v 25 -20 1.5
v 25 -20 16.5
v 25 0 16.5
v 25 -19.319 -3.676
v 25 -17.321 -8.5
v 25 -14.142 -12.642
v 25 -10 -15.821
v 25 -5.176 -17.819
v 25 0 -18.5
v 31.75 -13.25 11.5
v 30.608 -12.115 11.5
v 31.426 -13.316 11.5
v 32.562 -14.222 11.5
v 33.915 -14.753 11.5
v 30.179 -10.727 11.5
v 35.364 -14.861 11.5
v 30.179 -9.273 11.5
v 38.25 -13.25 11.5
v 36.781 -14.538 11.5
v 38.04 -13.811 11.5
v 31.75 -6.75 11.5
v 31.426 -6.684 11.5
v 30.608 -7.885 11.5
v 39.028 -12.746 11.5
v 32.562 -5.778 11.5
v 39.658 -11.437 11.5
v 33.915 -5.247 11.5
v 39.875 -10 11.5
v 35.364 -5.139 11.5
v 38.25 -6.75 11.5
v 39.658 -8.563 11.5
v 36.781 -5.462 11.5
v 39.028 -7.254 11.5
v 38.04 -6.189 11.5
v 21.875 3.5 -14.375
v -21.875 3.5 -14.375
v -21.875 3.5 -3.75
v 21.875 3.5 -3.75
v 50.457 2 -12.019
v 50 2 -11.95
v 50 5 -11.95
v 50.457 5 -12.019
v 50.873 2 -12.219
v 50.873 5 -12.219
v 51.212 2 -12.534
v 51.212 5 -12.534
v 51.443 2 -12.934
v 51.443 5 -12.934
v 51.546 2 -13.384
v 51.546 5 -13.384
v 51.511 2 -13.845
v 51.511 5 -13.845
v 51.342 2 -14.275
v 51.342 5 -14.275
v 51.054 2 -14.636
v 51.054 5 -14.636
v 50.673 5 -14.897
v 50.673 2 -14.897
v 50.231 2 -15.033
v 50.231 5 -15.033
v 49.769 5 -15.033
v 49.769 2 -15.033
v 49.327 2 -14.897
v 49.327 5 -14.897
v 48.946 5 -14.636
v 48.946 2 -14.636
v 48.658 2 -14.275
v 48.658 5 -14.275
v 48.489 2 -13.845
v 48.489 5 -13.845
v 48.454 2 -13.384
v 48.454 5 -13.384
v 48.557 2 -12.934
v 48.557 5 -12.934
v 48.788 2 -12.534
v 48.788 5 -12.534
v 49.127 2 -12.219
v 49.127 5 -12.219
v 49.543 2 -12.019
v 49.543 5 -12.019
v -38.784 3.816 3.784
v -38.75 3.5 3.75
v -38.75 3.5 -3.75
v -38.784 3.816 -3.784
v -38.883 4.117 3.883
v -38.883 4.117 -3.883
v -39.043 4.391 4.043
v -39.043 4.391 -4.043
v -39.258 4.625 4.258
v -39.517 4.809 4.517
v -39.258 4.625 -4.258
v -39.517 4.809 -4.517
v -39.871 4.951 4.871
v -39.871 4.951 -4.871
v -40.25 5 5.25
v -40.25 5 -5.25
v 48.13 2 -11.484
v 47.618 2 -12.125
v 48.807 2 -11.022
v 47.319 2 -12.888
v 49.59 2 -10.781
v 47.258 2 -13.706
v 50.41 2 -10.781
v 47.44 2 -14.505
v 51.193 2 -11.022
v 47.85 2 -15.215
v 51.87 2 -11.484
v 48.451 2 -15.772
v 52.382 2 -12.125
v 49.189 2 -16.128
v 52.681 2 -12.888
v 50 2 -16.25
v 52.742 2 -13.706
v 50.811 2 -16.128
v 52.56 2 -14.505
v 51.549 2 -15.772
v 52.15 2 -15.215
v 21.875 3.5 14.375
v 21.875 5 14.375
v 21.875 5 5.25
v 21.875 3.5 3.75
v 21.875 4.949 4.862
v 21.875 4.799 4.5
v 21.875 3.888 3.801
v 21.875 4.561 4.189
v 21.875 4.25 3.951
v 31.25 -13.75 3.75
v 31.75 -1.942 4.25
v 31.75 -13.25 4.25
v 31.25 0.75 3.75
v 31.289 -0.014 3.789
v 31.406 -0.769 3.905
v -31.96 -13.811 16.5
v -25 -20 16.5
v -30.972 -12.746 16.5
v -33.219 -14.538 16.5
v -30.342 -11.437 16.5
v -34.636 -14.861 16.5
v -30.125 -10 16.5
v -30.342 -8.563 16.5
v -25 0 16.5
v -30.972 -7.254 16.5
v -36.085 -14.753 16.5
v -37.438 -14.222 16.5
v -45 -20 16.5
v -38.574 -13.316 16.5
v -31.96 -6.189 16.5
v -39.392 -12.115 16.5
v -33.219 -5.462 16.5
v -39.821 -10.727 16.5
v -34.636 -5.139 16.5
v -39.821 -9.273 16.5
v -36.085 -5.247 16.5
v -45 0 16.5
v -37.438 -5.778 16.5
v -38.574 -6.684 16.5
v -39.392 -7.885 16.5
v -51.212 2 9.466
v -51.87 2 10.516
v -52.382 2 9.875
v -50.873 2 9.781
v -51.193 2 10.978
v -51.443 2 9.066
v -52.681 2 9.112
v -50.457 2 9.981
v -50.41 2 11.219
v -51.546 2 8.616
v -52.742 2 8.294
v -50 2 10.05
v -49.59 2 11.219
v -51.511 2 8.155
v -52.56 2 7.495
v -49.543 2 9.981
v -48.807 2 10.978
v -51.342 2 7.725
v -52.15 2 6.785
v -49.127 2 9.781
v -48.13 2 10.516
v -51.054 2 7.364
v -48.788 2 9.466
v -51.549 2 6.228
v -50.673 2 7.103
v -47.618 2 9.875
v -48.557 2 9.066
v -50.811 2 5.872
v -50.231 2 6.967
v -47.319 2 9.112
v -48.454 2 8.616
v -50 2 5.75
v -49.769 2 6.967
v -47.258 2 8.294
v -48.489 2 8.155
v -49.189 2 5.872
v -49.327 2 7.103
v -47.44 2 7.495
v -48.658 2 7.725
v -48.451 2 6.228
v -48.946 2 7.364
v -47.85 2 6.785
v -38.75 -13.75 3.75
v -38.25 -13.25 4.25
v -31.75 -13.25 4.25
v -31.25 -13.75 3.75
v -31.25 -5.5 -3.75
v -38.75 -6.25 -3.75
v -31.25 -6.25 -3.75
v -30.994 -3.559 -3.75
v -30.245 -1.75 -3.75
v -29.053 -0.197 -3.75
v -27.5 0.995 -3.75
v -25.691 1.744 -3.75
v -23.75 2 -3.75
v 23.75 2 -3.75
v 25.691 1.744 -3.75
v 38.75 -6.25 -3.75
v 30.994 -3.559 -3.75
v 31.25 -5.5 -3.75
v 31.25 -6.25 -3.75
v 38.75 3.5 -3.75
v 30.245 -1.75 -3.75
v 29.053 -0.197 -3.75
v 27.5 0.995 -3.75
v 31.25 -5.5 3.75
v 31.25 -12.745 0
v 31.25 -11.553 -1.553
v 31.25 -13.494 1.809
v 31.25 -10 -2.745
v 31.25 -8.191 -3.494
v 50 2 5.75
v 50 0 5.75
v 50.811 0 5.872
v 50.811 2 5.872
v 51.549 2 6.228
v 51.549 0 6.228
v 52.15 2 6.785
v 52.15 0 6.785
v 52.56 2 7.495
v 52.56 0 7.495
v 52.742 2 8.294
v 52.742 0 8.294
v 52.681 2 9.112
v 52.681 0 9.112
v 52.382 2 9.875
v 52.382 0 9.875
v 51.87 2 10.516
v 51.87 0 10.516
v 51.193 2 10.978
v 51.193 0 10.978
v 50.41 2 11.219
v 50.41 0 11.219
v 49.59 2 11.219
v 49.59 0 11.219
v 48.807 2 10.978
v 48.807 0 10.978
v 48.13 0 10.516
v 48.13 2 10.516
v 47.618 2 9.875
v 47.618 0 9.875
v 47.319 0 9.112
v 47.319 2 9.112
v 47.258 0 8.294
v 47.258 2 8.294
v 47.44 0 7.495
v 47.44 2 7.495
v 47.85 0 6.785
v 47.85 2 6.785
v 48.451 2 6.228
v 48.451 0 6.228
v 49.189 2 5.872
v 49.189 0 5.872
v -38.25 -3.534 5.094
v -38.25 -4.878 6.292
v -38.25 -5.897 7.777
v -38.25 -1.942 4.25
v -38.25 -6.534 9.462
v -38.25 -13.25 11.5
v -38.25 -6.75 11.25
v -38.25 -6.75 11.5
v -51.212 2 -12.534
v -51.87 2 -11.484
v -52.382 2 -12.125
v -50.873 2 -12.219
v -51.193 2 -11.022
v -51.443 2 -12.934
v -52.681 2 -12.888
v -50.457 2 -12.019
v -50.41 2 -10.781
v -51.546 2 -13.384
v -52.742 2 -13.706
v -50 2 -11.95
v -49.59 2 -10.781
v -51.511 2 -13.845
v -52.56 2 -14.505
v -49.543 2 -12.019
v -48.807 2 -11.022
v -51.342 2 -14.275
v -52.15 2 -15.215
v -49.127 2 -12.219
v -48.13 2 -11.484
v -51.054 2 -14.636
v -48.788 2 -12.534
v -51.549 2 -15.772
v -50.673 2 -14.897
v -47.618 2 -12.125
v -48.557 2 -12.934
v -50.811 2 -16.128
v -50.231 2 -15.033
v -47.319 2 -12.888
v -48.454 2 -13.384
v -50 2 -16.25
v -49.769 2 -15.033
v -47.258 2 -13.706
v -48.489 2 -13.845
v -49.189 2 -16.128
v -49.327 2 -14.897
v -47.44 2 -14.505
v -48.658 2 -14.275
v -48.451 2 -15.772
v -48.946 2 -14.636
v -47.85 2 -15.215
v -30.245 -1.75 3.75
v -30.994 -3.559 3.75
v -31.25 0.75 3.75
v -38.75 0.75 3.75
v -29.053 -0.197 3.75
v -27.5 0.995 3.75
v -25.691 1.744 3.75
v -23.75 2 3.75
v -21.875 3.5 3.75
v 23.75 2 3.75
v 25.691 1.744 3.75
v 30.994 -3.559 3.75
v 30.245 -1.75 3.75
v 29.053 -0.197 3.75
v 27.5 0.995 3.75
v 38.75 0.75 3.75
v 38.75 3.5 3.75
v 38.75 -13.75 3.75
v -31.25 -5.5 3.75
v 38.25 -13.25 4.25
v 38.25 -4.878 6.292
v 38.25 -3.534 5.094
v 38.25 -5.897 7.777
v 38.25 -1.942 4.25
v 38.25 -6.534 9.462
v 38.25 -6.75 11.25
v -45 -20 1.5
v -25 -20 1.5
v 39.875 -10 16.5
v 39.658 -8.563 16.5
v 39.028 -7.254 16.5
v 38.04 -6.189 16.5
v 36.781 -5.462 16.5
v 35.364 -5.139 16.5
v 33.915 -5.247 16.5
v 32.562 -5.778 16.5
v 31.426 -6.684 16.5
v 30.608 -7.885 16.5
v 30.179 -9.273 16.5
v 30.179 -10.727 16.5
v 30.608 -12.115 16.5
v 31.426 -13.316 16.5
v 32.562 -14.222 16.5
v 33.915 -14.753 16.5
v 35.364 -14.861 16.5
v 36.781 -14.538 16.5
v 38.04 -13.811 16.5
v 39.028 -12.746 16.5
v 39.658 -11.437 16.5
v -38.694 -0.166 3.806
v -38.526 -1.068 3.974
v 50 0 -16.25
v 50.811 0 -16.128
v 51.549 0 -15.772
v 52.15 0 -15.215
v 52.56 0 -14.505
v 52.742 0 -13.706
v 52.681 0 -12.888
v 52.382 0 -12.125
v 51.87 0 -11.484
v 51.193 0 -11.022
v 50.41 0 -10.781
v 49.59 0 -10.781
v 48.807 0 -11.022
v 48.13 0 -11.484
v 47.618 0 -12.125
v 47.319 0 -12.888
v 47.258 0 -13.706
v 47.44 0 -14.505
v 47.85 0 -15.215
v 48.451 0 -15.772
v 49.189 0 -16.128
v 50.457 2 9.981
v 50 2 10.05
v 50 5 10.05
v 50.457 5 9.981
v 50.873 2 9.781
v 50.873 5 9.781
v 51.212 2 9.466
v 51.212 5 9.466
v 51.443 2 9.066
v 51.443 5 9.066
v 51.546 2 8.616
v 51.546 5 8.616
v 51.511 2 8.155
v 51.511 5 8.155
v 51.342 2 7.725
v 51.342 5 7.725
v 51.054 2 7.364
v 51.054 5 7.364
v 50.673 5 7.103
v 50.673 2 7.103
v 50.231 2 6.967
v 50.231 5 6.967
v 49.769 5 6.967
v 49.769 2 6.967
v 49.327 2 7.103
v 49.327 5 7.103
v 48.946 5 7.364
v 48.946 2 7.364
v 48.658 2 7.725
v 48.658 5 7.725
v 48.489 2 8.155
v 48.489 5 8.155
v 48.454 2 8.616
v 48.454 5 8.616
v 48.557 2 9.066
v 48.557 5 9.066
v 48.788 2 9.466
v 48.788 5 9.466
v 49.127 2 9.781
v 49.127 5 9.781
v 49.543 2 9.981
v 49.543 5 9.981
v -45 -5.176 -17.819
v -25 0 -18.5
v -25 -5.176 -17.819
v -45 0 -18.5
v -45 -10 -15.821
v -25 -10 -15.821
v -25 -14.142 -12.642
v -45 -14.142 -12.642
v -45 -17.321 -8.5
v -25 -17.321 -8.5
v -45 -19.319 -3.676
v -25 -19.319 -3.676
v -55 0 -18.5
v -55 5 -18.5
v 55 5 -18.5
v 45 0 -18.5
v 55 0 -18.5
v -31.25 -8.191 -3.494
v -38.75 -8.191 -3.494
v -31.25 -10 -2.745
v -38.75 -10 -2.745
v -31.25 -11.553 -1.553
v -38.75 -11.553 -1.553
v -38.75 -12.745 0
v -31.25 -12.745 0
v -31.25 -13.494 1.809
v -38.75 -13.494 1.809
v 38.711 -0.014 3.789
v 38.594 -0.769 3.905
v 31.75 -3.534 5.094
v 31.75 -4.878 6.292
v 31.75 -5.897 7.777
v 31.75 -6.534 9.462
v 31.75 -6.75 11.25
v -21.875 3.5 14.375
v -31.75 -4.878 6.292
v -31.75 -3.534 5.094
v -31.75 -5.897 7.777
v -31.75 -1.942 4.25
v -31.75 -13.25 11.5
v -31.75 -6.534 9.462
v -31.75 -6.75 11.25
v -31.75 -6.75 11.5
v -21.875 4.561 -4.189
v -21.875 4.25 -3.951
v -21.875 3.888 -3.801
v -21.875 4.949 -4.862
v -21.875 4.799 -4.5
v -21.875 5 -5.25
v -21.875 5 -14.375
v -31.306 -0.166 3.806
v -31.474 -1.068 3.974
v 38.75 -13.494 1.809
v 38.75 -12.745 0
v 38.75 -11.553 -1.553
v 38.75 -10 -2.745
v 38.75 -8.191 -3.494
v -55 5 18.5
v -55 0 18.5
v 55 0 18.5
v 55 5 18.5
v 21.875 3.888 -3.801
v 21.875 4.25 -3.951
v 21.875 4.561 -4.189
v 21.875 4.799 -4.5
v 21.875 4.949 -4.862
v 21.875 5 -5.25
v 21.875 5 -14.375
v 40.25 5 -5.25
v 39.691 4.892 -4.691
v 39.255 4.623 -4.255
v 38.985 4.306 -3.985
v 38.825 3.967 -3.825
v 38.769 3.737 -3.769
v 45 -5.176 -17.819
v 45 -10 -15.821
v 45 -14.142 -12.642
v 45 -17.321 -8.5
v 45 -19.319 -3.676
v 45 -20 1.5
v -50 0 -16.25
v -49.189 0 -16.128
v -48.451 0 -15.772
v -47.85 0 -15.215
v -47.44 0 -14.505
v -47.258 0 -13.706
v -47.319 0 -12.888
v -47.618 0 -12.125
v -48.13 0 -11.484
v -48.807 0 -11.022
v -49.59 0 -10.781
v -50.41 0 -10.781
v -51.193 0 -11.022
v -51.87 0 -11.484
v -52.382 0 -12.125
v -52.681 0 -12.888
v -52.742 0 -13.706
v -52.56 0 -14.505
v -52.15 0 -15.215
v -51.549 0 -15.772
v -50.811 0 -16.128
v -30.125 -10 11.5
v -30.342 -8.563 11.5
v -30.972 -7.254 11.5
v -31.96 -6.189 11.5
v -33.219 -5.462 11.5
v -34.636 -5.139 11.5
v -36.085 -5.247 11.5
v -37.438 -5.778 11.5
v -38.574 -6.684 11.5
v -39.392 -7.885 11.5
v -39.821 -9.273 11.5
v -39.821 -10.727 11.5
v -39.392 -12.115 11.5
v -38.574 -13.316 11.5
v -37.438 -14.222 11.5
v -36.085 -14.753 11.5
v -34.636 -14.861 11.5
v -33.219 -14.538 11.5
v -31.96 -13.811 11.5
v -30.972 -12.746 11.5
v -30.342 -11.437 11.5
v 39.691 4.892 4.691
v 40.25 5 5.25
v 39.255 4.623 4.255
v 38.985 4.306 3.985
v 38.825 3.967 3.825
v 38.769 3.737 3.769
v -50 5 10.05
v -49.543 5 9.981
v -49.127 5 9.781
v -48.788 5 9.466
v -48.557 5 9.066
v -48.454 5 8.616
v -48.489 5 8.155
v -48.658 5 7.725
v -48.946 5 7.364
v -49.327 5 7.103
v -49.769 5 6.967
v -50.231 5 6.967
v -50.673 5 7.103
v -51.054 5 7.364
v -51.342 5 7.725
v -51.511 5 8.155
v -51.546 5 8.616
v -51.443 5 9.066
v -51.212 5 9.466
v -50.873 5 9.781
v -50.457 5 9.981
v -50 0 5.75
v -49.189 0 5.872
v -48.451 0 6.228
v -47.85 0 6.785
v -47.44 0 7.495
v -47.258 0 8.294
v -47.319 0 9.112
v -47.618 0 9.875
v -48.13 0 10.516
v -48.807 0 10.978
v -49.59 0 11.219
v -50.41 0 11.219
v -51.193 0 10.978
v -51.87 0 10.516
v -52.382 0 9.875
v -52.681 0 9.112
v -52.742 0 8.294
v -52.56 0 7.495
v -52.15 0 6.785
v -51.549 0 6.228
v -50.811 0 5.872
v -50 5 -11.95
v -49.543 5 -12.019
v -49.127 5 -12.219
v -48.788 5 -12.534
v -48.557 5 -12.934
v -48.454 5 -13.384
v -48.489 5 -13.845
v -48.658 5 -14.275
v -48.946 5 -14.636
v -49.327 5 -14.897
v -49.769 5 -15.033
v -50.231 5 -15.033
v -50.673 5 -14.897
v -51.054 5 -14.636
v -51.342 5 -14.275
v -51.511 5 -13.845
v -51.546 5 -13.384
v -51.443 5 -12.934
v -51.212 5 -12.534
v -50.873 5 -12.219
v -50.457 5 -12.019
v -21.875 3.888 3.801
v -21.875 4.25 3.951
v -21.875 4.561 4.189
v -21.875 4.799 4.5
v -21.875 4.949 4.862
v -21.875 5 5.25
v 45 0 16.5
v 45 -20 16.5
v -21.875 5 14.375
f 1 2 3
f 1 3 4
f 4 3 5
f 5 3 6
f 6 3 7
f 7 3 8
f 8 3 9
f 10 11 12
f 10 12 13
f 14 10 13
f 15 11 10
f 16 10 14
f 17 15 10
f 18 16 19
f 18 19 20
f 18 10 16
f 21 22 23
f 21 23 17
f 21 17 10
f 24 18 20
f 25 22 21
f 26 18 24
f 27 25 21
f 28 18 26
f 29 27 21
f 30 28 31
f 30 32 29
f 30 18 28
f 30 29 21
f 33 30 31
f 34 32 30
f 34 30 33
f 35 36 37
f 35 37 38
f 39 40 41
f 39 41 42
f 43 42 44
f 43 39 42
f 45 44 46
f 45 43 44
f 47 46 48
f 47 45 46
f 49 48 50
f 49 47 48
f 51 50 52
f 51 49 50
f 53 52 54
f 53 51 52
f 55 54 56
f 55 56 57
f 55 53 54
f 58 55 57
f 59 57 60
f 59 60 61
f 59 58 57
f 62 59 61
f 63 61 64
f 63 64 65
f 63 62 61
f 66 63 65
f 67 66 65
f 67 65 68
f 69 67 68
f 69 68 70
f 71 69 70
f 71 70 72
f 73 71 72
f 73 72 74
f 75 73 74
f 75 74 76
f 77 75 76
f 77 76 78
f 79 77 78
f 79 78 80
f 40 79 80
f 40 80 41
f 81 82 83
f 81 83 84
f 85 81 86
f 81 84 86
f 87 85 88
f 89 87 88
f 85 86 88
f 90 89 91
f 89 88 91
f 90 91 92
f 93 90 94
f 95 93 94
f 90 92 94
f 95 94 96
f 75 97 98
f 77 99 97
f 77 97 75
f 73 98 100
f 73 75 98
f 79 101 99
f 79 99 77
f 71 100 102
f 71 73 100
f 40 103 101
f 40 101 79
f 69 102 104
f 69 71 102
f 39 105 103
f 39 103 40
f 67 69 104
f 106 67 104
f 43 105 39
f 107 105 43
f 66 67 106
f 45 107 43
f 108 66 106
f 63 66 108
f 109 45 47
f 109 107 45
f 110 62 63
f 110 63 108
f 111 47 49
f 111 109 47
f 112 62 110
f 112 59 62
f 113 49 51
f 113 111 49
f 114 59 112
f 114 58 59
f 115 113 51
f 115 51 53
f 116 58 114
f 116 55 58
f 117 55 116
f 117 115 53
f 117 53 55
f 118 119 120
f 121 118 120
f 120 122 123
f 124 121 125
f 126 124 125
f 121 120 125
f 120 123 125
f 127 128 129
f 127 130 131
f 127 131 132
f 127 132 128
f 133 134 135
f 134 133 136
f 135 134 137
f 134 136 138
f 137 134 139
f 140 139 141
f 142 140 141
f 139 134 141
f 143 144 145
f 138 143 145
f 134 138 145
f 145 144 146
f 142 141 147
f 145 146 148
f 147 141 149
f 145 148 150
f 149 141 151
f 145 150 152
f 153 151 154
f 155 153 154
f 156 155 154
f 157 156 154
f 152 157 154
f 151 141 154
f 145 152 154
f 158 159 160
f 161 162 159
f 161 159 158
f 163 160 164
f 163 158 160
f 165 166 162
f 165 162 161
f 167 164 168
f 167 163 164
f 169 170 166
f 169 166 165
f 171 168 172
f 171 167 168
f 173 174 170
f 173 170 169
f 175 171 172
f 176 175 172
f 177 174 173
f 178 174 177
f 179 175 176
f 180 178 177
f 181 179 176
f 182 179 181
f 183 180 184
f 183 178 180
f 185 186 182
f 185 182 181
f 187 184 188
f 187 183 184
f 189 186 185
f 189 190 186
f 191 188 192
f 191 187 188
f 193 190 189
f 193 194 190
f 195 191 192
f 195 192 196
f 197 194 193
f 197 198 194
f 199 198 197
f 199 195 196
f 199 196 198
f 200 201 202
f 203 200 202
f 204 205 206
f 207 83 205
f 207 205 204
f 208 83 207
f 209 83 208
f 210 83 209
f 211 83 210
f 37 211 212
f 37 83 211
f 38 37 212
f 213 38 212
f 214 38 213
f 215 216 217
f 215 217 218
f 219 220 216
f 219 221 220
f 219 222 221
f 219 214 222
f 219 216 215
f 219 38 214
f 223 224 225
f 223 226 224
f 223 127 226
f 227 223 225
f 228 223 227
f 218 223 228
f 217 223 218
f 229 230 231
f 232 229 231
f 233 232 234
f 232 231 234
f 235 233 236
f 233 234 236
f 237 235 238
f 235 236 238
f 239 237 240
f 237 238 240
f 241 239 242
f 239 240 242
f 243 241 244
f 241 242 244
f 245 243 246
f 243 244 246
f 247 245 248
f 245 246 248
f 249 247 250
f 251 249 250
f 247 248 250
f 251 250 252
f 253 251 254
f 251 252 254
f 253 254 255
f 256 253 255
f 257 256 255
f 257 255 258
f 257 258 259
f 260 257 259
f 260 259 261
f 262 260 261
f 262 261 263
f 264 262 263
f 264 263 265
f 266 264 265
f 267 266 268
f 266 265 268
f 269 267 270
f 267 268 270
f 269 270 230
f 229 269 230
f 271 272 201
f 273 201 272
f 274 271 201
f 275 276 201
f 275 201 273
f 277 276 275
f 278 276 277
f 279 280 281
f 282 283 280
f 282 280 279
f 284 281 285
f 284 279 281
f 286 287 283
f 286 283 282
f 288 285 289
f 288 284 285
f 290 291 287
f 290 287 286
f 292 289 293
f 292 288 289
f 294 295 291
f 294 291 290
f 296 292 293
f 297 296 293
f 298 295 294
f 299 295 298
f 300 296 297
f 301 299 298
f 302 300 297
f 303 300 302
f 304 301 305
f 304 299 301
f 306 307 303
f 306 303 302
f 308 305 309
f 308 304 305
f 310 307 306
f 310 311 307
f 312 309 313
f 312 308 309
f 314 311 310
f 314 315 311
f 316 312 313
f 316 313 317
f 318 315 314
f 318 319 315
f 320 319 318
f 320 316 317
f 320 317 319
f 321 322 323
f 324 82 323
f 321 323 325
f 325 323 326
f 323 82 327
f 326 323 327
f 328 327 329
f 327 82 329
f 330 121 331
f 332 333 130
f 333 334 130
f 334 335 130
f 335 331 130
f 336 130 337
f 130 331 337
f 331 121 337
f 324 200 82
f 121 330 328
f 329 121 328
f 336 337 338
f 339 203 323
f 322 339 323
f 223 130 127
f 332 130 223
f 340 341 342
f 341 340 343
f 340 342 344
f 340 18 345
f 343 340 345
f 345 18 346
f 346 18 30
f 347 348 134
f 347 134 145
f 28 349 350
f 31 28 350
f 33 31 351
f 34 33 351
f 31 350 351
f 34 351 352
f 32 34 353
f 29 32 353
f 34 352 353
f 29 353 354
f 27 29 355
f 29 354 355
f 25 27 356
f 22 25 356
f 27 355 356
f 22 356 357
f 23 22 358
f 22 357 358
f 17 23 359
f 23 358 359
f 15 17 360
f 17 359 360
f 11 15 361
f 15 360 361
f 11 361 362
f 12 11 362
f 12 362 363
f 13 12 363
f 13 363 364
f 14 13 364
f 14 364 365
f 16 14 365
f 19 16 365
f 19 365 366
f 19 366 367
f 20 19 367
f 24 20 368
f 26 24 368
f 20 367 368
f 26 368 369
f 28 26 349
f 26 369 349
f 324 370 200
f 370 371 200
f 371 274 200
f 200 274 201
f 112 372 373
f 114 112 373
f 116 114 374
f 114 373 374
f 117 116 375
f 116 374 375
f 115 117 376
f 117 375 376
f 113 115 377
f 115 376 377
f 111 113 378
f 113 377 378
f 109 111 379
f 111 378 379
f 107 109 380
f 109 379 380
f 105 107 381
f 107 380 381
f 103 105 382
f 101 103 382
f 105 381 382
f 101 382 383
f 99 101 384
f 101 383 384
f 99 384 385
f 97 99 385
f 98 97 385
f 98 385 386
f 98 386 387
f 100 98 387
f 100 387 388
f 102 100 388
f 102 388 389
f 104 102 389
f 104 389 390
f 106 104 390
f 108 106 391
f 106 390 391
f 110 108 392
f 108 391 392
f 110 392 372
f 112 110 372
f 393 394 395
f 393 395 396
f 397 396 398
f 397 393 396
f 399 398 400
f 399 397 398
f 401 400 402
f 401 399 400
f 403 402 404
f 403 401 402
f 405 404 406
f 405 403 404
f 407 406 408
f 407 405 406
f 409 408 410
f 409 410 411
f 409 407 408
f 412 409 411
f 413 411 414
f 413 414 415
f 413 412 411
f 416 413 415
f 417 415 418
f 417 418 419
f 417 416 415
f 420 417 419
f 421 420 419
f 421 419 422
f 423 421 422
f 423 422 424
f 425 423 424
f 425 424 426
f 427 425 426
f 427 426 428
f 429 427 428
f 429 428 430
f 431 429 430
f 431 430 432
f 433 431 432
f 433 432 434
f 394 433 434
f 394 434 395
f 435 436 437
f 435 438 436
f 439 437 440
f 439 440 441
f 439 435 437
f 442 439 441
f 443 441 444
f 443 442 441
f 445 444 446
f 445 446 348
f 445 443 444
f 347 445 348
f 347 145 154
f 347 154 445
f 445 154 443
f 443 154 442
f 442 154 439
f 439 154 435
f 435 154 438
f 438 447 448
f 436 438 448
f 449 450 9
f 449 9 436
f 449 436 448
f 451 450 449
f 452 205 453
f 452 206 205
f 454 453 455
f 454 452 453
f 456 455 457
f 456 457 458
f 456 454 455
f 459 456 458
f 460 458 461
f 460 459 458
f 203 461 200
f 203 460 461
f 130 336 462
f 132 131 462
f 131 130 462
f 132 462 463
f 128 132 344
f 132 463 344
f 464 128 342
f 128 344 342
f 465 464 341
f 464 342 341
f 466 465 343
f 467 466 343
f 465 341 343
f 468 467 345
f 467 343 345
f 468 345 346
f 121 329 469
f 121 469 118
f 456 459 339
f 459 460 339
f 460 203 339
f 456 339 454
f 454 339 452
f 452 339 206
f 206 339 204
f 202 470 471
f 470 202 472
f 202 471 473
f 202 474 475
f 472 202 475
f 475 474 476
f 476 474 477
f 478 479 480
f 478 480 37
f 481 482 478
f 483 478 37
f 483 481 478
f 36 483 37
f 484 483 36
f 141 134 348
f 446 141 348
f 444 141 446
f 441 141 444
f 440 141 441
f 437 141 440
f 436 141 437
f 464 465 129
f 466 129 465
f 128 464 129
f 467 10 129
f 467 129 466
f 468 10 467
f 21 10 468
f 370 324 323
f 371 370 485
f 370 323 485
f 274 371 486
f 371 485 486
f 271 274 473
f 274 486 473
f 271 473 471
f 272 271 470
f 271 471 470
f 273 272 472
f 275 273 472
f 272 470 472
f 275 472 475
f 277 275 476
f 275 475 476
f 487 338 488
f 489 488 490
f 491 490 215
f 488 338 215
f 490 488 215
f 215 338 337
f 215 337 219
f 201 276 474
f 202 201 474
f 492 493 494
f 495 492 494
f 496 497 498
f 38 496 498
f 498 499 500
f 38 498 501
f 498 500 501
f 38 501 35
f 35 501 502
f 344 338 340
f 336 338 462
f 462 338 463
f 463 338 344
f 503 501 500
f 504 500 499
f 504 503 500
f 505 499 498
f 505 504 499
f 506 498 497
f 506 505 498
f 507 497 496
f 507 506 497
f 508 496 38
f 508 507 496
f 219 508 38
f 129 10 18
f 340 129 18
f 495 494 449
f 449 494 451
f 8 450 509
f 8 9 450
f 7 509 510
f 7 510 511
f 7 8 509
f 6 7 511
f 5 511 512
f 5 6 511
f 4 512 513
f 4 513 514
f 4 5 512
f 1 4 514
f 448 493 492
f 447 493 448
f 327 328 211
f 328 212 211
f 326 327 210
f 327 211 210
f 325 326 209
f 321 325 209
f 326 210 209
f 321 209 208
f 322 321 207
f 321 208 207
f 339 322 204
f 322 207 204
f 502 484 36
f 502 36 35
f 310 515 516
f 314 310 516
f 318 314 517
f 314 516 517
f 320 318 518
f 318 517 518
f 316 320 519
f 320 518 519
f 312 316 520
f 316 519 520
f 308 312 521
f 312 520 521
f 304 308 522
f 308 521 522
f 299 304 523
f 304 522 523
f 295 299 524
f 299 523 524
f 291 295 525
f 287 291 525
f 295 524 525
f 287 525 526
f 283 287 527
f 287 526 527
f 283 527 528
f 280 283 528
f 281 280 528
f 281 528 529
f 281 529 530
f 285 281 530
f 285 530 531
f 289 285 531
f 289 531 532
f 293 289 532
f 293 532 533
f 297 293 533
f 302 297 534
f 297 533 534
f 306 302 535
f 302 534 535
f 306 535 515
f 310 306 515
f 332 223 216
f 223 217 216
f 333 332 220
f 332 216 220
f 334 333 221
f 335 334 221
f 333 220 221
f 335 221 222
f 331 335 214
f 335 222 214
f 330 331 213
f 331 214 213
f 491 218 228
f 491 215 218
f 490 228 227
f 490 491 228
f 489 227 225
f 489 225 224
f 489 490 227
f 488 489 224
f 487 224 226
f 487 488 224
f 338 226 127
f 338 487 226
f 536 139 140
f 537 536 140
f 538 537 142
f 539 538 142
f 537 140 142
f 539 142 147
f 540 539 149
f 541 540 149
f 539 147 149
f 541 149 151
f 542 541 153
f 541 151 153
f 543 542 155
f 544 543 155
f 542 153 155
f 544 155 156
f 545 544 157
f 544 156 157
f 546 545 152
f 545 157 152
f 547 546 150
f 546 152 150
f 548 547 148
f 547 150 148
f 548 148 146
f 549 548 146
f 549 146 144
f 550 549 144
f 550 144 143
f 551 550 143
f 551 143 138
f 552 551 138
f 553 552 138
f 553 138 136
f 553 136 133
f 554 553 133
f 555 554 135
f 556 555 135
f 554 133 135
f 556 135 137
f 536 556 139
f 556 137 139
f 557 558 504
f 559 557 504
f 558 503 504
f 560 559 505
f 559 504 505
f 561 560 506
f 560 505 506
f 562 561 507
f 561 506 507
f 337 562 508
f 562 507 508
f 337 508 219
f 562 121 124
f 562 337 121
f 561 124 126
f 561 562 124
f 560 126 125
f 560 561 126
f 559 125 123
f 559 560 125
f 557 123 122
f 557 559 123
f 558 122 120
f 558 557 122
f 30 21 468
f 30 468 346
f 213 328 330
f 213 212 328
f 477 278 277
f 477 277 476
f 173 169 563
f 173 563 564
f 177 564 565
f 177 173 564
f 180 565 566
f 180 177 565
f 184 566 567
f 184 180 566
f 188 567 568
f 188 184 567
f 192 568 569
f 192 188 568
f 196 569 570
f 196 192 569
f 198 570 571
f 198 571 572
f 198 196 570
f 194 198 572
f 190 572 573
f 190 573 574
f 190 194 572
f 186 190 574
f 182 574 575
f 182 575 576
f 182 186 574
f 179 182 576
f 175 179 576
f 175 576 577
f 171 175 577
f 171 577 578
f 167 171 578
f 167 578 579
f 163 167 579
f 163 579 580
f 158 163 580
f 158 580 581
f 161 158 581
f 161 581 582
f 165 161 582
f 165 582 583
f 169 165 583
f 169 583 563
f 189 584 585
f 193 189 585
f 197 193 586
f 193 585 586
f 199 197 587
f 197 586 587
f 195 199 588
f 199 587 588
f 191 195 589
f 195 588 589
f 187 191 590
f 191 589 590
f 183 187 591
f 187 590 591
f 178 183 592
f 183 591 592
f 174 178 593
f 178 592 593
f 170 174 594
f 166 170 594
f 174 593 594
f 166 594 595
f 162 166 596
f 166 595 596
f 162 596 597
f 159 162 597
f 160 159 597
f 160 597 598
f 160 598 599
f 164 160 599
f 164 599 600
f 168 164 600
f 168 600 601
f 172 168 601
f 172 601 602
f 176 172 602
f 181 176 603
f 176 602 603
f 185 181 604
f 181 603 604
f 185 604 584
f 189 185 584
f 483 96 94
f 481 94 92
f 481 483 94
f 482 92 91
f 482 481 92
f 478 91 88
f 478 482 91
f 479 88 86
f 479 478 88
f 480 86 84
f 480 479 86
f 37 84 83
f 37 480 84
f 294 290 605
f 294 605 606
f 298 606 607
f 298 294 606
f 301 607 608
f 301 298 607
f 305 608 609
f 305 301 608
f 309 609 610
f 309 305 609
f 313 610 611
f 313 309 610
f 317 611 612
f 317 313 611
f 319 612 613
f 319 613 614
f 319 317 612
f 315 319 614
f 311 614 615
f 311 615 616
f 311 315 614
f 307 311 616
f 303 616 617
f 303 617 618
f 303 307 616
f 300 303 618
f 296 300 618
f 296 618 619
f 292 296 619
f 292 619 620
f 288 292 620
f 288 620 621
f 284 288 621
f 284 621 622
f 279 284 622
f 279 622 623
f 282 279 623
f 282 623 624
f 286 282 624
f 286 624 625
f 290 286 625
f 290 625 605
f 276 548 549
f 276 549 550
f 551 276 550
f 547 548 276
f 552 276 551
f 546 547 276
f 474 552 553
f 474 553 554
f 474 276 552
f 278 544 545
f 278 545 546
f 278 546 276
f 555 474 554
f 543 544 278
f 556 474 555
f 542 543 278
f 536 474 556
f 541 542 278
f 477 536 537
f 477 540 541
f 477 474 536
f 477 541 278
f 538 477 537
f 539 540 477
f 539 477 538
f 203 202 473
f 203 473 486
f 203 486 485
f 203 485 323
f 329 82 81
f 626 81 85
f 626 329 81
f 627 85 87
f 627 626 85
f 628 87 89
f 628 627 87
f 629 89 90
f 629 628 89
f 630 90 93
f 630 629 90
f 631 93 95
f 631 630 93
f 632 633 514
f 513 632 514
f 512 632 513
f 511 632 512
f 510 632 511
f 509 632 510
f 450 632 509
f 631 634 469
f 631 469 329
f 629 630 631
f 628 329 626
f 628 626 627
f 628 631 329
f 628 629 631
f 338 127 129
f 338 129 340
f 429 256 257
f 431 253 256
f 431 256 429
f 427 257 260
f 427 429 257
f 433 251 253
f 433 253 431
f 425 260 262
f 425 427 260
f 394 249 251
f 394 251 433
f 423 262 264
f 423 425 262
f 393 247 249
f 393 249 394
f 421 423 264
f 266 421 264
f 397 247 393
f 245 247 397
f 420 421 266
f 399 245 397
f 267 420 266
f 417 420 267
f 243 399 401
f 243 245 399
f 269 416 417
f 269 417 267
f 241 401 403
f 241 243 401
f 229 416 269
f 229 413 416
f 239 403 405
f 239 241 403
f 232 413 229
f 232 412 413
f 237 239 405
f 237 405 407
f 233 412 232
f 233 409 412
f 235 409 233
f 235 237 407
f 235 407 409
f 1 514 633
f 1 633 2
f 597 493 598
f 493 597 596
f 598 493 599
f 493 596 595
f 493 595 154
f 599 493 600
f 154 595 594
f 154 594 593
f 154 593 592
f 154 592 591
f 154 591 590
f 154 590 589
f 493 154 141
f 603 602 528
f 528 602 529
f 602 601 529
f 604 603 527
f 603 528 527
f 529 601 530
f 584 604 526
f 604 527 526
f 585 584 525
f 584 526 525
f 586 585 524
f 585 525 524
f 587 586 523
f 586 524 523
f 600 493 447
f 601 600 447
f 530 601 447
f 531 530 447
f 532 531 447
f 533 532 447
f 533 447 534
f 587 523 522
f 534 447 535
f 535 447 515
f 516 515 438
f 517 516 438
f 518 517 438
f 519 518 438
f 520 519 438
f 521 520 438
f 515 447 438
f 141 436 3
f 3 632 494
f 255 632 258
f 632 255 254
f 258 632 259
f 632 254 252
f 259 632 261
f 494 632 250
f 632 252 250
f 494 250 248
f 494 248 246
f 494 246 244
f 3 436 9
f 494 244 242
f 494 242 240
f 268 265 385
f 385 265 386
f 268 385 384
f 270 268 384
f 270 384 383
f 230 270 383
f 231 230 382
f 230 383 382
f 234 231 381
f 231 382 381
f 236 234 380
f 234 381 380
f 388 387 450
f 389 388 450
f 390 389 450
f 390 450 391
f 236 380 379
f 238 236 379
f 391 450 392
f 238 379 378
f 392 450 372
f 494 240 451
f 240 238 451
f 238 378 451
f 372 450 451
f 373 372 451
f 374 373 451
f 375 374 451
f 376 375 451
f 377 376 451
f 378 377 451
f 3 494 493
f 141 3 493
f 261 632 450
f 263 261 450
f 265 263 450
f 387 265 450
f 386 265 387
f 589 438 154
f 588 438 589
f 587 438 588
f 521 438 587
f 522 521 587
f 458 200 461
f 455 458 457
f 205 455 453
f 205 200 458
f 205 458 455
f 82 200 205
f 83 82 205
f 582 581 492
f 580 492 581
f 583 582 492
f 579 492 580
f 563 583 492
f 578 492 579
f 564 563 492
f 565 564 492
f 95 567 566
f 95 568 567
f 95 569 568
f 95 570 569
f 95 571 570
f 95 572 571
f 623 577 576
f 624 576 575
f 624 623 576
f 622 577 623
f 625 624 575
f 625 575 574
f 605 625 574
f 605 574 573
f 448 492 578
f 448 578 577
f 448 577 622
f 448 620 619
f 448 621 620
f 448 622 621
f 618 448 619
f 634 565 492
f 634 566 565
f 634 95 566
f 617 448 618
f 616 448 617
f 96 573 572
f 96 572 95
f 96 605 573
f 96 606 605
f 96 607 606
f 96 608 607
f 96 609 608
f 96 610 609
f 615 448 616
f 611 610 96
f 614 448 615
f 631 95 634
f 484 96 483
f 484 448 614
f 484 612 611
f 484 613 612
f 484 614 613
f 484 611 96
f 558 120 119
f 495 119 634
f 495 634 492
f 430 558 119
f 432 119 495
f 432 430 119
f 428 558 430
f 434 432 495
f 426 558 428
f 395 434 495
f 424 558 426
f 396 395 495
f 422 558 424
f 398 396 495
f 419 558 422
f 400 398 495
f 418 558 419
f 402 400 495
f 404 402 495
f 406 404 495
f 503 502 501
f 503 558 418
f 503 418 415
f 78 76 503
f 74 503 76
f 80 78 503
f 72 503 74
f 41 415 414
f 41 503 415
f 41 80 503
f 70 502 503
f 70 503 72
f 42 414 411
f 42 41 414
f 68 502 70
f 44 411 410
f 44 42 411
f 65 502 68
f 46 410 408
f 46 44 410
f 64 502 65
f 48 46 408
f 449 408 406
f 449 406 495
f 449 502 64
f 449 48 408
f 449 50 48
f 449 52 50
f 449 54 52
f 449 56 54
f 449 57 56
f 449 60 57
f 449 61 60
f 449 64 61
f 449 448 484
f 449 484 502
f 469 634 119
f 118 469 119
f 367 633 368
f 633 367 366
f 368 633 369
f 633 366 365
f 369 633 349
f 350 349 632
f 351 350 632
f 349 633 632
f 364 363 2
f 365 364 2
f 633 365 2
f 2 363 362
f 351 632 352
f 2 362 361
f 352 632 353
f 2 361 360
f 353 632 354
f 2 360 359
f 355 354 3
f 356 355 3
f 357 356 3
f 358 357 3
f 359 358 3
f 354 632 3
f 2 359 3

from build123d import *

# Parameters (mm, degrees)
SKETCH1_W           = 110
SKETCH1_H           = 37
SKETCH1_R           = 1.55
BOSS_EXTRUDE1_DEPTH = 5
SKETCH2_W           = 43.75
SKETCH2_H           = 28.75
CUT_EXTRUDE1_DEPTH  = 1.5
SKETCH3_W           = 20
SKETCH3_H           = 35
BOSS_EXTRUDE2_DEPTH = 20
FILLET1_R           = 20
SKETCH4_W           = 7.5
SKETCH4_H           = 7.5
CUT_EXTRUDE2_DEPTH  = 18.75
SKETCH5_W           = 6.5
SKETCH5_H           = 6.5
CUT_EXTRUDE3_DEPTH  = 15
FILLET2_R           = 7.5
CHAMFER1_SIZE       = 0.5
SKETCH7_R           = 4.875
CUT_EXTRUDE5_DEPTH  = 5
SKETCH8_R           = 2.75
CUT_EXTRUDE6_DEPTH  = 2
SKETCH9_W           = 62.5
SKETCH9_H           = 7.5
CUT_EXTRUDE7_DEPTH  = 3
FILLET3_R           = 7.5
FILLET4_R           = 1.5


with BuildPart() as part:
    # Sketch1 → Boss-Extrude1 (new body)
    with BuildSketch(Plane(origin=(0, 0, 0), x_dir=(1, 0, 0), z_dir=(0, 1, 0))):
        Rectangle(SKETCH1_W, SKETCH1_H)
        with Locations(Location((50, -8.5, 0), (0, 0, 270))):
            Circle(SKETCH1_R, mode=Mode.SUBTRACT)
        with Locations(Location((50, 13.5, 0), (0, 0, 270))):
            Circle(SKETCH1_R, mode=Mode.SUBTRACT)
        with Locations(Location((-50, 13.5, 0), (0, 0, 270))):
            Circle(SKETCH1_R, mode=Mode.SUBTRACT)
        with Locations(Location((-50, -8.5, 0), (0, 0, 270))):
            Circle(SKETCH1_R, mode=Mode.SUBTRACT)
    extrude(amount=BOSS_EXTRUDE1_DEPTH)

    # Sketch2 → Cut-Extrude1 (cut)
    with BuildSketch(Plane(origin=(0, 5, 0), x_dir=(1, 0, 0), z_dir=(0, 1, 0))):
        Rectangle(SKETCH2_W, SKETCH2_H)
    extrude(amount=-CUT_EXTRUDE1_DEPTH, mode=Mode.SUBTRACT)

    # Sketch3 → Boss-Extrude2 (add)
    with BuildSketch(Plane(origin=(0, 0, 0), x_dir=(-1, 0, 0), z_dir=(0, -1, 0))):
        with Locations((35, 1)):
            Rectangle(SKETCH3_W, SKETCH3_H)
        with Locations((-35, 1)):
            Rectangle(SKETCH3_W, SKETCH3_H)
    extrude(amount=BOSS_EXTRUDE2_DEPTH)

    # Fillet1
    fillet1_edges = [part.edges().sort_by_distance(p)[0] for p in [
        (35, -20, -18.5),
        (-35, -20, -18.5),
    ]]
    fillet(fillet1_edges, radius=FILLET1_R)

    # Sketch4 → Cut-Extrude2 (cut)
    with BuildSketch(Plane(origin=(0, 5, 0), x_dir=(1, 0, 0), z_dir=(0, 1, 0))):
        with Locations((-35, 0)):
            Rectangle(SKETCH4_W, SKETCH4_H)
        with Locations((35, 0)):
            Rectangle(SKETCH4_W, SKETCH4_H)
    extrude(amount=-CUT_EXTRUDE2_DEPTH, mode=Mode.SUBTRACT)

    # Sketch5 → Cut-Extrude3 (cut)
    with BuildSketch(Plane.XY.offset(16.5)):
        with Locations((-35, -10)):
            Rectangle(SKETCH5_W, SKETCH5_H)
        with Locations((35, -10)):
            Rectangle(SKETCH5_W, SKETCH5_H)
    extrude(amount=-CUT_EXTRUDE3_DEPTH, mode=Mode.SUBTRACT)

    # Fillet2
    fillet2_edges = [part.edges().sort_by_distance(p)[0] for p in [
        (35, -6.75, 3.75),
        (35, -13.75, -3.75),
        (-35, -13.75, -3.75),
        (-35, -6.75, 3.75),
    ]]
    fillet(fillet2_edges, radius=FILLET2_R - 0.0001)  # a hair under: the kernel refuses the full size

    # Chamfer1
    chamfer1_edges = [part.edges().sort_by_distance(p)[0] for p in [
        (-38.25, -6.25005, 3.75),
        (-35, -13.25, 3.75),
        (-31.75, -6.25005, 3.75),
        (31.75, -6.25005, 3.75),
        (35, -13.25, 3.75),
        (38.25, -6.25005, 3.75),
    ]]
    chamfer(chamfer1_edges, length=CHAMFER1_SIZE - 0.0001)  # a hair under: the kernel refuses the full size

    # Sketch7 → Cut-Extrude5 (cut)
    with BuildSketch(Plane.XY.offset(16.5)):
        with Locations((-35, -10)):
            Circle(SKETCH7_R)
        with Locations((35, -10)):
            Circle(SKETCH7_R)
    extrude(amount=-CUT_EXTRUDE5_DEPTH, mode=Mode.SUBTRACT)

    # Sketch8 → Cut-Extrude6 (cut)
    with BuildSketch(Plane.XZ):
        with Locations(Location((-50, 8.5, 0), (0, 0, 270))):
            Circle(SKETCH8_R)
        with Locations(Location((-50, -13.5, 0), (0, 0, 270))):
            Circle(SKETCH8_R)
        with Locations(Location((50, -13.5, 0), (0, 0, 270))):
            Circle(SKETCH8_R)
        with Locations(Location((50, 8.5, 0), (0, 0, 270))):
            Circle(SKETCH8_R)
    extrude(amount=-CUT_EXTRUDE6_DEPTH, mode=Mode.SUBTRACT)

    # Sketch9 → Cut-Extrude7 (cut)
    with BuildSketch(Plane(origin=(0, 5, 0), x_dir=(1, 0, 0), z_dir=(0, 1, 0))):
        Rectangle(SKETCH9_W, SKETCH9_H)
    extrude(amount=-CUT_EXTRUDE7_DEPTH, mode=Mode.SUBTRACT)

    # Fillet3
    fillet3_edges = [part.edges().sort_by_distance(p)[0] for p in [
        (-31.25, 2, 0),
        (31.25, 2, 0),
    ]]
    fillet(fillet3_edges, radius=FILLET3_R)

    # Fillet4
    fillet4_edges = [part.edges().sort_by_distance(p)[0] for p in [
        (-38.75, 5, 0),
        (-30.3125, 5, -3.75),
        (-30.3125, 5, 3.75),
        (38.75, 5, 0),
        (30.3125, 5, 3.75),
        (30.3125, 5, -3.75),
    ]]
    fillet(fillet4_edges, radius=FILLET4_R)


solid = part.part
